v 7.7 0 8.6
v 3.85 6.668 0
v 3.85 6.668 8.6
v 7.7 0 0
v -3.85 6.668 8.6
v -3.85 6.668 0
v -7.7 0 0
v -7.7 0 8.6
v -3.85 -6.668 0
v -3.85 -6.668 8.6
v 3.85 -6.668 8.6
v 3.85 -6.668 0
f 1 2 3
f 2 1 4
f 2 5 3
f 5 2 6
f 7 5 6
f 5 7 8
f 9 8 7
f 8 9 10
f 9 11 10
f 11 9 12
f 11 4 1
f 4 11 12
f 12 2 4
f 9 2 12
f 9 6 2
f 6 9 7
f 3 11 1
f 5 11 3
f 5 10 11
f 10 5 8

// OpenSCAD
module m8_nut() {
    add = 2.4;
    width = 13;
    height = 6.2;
    
    radius = (width + add) / 2;
    
    cylinder(height + add, radius, radius, $fn = 6);
    
}



m8_nut();
